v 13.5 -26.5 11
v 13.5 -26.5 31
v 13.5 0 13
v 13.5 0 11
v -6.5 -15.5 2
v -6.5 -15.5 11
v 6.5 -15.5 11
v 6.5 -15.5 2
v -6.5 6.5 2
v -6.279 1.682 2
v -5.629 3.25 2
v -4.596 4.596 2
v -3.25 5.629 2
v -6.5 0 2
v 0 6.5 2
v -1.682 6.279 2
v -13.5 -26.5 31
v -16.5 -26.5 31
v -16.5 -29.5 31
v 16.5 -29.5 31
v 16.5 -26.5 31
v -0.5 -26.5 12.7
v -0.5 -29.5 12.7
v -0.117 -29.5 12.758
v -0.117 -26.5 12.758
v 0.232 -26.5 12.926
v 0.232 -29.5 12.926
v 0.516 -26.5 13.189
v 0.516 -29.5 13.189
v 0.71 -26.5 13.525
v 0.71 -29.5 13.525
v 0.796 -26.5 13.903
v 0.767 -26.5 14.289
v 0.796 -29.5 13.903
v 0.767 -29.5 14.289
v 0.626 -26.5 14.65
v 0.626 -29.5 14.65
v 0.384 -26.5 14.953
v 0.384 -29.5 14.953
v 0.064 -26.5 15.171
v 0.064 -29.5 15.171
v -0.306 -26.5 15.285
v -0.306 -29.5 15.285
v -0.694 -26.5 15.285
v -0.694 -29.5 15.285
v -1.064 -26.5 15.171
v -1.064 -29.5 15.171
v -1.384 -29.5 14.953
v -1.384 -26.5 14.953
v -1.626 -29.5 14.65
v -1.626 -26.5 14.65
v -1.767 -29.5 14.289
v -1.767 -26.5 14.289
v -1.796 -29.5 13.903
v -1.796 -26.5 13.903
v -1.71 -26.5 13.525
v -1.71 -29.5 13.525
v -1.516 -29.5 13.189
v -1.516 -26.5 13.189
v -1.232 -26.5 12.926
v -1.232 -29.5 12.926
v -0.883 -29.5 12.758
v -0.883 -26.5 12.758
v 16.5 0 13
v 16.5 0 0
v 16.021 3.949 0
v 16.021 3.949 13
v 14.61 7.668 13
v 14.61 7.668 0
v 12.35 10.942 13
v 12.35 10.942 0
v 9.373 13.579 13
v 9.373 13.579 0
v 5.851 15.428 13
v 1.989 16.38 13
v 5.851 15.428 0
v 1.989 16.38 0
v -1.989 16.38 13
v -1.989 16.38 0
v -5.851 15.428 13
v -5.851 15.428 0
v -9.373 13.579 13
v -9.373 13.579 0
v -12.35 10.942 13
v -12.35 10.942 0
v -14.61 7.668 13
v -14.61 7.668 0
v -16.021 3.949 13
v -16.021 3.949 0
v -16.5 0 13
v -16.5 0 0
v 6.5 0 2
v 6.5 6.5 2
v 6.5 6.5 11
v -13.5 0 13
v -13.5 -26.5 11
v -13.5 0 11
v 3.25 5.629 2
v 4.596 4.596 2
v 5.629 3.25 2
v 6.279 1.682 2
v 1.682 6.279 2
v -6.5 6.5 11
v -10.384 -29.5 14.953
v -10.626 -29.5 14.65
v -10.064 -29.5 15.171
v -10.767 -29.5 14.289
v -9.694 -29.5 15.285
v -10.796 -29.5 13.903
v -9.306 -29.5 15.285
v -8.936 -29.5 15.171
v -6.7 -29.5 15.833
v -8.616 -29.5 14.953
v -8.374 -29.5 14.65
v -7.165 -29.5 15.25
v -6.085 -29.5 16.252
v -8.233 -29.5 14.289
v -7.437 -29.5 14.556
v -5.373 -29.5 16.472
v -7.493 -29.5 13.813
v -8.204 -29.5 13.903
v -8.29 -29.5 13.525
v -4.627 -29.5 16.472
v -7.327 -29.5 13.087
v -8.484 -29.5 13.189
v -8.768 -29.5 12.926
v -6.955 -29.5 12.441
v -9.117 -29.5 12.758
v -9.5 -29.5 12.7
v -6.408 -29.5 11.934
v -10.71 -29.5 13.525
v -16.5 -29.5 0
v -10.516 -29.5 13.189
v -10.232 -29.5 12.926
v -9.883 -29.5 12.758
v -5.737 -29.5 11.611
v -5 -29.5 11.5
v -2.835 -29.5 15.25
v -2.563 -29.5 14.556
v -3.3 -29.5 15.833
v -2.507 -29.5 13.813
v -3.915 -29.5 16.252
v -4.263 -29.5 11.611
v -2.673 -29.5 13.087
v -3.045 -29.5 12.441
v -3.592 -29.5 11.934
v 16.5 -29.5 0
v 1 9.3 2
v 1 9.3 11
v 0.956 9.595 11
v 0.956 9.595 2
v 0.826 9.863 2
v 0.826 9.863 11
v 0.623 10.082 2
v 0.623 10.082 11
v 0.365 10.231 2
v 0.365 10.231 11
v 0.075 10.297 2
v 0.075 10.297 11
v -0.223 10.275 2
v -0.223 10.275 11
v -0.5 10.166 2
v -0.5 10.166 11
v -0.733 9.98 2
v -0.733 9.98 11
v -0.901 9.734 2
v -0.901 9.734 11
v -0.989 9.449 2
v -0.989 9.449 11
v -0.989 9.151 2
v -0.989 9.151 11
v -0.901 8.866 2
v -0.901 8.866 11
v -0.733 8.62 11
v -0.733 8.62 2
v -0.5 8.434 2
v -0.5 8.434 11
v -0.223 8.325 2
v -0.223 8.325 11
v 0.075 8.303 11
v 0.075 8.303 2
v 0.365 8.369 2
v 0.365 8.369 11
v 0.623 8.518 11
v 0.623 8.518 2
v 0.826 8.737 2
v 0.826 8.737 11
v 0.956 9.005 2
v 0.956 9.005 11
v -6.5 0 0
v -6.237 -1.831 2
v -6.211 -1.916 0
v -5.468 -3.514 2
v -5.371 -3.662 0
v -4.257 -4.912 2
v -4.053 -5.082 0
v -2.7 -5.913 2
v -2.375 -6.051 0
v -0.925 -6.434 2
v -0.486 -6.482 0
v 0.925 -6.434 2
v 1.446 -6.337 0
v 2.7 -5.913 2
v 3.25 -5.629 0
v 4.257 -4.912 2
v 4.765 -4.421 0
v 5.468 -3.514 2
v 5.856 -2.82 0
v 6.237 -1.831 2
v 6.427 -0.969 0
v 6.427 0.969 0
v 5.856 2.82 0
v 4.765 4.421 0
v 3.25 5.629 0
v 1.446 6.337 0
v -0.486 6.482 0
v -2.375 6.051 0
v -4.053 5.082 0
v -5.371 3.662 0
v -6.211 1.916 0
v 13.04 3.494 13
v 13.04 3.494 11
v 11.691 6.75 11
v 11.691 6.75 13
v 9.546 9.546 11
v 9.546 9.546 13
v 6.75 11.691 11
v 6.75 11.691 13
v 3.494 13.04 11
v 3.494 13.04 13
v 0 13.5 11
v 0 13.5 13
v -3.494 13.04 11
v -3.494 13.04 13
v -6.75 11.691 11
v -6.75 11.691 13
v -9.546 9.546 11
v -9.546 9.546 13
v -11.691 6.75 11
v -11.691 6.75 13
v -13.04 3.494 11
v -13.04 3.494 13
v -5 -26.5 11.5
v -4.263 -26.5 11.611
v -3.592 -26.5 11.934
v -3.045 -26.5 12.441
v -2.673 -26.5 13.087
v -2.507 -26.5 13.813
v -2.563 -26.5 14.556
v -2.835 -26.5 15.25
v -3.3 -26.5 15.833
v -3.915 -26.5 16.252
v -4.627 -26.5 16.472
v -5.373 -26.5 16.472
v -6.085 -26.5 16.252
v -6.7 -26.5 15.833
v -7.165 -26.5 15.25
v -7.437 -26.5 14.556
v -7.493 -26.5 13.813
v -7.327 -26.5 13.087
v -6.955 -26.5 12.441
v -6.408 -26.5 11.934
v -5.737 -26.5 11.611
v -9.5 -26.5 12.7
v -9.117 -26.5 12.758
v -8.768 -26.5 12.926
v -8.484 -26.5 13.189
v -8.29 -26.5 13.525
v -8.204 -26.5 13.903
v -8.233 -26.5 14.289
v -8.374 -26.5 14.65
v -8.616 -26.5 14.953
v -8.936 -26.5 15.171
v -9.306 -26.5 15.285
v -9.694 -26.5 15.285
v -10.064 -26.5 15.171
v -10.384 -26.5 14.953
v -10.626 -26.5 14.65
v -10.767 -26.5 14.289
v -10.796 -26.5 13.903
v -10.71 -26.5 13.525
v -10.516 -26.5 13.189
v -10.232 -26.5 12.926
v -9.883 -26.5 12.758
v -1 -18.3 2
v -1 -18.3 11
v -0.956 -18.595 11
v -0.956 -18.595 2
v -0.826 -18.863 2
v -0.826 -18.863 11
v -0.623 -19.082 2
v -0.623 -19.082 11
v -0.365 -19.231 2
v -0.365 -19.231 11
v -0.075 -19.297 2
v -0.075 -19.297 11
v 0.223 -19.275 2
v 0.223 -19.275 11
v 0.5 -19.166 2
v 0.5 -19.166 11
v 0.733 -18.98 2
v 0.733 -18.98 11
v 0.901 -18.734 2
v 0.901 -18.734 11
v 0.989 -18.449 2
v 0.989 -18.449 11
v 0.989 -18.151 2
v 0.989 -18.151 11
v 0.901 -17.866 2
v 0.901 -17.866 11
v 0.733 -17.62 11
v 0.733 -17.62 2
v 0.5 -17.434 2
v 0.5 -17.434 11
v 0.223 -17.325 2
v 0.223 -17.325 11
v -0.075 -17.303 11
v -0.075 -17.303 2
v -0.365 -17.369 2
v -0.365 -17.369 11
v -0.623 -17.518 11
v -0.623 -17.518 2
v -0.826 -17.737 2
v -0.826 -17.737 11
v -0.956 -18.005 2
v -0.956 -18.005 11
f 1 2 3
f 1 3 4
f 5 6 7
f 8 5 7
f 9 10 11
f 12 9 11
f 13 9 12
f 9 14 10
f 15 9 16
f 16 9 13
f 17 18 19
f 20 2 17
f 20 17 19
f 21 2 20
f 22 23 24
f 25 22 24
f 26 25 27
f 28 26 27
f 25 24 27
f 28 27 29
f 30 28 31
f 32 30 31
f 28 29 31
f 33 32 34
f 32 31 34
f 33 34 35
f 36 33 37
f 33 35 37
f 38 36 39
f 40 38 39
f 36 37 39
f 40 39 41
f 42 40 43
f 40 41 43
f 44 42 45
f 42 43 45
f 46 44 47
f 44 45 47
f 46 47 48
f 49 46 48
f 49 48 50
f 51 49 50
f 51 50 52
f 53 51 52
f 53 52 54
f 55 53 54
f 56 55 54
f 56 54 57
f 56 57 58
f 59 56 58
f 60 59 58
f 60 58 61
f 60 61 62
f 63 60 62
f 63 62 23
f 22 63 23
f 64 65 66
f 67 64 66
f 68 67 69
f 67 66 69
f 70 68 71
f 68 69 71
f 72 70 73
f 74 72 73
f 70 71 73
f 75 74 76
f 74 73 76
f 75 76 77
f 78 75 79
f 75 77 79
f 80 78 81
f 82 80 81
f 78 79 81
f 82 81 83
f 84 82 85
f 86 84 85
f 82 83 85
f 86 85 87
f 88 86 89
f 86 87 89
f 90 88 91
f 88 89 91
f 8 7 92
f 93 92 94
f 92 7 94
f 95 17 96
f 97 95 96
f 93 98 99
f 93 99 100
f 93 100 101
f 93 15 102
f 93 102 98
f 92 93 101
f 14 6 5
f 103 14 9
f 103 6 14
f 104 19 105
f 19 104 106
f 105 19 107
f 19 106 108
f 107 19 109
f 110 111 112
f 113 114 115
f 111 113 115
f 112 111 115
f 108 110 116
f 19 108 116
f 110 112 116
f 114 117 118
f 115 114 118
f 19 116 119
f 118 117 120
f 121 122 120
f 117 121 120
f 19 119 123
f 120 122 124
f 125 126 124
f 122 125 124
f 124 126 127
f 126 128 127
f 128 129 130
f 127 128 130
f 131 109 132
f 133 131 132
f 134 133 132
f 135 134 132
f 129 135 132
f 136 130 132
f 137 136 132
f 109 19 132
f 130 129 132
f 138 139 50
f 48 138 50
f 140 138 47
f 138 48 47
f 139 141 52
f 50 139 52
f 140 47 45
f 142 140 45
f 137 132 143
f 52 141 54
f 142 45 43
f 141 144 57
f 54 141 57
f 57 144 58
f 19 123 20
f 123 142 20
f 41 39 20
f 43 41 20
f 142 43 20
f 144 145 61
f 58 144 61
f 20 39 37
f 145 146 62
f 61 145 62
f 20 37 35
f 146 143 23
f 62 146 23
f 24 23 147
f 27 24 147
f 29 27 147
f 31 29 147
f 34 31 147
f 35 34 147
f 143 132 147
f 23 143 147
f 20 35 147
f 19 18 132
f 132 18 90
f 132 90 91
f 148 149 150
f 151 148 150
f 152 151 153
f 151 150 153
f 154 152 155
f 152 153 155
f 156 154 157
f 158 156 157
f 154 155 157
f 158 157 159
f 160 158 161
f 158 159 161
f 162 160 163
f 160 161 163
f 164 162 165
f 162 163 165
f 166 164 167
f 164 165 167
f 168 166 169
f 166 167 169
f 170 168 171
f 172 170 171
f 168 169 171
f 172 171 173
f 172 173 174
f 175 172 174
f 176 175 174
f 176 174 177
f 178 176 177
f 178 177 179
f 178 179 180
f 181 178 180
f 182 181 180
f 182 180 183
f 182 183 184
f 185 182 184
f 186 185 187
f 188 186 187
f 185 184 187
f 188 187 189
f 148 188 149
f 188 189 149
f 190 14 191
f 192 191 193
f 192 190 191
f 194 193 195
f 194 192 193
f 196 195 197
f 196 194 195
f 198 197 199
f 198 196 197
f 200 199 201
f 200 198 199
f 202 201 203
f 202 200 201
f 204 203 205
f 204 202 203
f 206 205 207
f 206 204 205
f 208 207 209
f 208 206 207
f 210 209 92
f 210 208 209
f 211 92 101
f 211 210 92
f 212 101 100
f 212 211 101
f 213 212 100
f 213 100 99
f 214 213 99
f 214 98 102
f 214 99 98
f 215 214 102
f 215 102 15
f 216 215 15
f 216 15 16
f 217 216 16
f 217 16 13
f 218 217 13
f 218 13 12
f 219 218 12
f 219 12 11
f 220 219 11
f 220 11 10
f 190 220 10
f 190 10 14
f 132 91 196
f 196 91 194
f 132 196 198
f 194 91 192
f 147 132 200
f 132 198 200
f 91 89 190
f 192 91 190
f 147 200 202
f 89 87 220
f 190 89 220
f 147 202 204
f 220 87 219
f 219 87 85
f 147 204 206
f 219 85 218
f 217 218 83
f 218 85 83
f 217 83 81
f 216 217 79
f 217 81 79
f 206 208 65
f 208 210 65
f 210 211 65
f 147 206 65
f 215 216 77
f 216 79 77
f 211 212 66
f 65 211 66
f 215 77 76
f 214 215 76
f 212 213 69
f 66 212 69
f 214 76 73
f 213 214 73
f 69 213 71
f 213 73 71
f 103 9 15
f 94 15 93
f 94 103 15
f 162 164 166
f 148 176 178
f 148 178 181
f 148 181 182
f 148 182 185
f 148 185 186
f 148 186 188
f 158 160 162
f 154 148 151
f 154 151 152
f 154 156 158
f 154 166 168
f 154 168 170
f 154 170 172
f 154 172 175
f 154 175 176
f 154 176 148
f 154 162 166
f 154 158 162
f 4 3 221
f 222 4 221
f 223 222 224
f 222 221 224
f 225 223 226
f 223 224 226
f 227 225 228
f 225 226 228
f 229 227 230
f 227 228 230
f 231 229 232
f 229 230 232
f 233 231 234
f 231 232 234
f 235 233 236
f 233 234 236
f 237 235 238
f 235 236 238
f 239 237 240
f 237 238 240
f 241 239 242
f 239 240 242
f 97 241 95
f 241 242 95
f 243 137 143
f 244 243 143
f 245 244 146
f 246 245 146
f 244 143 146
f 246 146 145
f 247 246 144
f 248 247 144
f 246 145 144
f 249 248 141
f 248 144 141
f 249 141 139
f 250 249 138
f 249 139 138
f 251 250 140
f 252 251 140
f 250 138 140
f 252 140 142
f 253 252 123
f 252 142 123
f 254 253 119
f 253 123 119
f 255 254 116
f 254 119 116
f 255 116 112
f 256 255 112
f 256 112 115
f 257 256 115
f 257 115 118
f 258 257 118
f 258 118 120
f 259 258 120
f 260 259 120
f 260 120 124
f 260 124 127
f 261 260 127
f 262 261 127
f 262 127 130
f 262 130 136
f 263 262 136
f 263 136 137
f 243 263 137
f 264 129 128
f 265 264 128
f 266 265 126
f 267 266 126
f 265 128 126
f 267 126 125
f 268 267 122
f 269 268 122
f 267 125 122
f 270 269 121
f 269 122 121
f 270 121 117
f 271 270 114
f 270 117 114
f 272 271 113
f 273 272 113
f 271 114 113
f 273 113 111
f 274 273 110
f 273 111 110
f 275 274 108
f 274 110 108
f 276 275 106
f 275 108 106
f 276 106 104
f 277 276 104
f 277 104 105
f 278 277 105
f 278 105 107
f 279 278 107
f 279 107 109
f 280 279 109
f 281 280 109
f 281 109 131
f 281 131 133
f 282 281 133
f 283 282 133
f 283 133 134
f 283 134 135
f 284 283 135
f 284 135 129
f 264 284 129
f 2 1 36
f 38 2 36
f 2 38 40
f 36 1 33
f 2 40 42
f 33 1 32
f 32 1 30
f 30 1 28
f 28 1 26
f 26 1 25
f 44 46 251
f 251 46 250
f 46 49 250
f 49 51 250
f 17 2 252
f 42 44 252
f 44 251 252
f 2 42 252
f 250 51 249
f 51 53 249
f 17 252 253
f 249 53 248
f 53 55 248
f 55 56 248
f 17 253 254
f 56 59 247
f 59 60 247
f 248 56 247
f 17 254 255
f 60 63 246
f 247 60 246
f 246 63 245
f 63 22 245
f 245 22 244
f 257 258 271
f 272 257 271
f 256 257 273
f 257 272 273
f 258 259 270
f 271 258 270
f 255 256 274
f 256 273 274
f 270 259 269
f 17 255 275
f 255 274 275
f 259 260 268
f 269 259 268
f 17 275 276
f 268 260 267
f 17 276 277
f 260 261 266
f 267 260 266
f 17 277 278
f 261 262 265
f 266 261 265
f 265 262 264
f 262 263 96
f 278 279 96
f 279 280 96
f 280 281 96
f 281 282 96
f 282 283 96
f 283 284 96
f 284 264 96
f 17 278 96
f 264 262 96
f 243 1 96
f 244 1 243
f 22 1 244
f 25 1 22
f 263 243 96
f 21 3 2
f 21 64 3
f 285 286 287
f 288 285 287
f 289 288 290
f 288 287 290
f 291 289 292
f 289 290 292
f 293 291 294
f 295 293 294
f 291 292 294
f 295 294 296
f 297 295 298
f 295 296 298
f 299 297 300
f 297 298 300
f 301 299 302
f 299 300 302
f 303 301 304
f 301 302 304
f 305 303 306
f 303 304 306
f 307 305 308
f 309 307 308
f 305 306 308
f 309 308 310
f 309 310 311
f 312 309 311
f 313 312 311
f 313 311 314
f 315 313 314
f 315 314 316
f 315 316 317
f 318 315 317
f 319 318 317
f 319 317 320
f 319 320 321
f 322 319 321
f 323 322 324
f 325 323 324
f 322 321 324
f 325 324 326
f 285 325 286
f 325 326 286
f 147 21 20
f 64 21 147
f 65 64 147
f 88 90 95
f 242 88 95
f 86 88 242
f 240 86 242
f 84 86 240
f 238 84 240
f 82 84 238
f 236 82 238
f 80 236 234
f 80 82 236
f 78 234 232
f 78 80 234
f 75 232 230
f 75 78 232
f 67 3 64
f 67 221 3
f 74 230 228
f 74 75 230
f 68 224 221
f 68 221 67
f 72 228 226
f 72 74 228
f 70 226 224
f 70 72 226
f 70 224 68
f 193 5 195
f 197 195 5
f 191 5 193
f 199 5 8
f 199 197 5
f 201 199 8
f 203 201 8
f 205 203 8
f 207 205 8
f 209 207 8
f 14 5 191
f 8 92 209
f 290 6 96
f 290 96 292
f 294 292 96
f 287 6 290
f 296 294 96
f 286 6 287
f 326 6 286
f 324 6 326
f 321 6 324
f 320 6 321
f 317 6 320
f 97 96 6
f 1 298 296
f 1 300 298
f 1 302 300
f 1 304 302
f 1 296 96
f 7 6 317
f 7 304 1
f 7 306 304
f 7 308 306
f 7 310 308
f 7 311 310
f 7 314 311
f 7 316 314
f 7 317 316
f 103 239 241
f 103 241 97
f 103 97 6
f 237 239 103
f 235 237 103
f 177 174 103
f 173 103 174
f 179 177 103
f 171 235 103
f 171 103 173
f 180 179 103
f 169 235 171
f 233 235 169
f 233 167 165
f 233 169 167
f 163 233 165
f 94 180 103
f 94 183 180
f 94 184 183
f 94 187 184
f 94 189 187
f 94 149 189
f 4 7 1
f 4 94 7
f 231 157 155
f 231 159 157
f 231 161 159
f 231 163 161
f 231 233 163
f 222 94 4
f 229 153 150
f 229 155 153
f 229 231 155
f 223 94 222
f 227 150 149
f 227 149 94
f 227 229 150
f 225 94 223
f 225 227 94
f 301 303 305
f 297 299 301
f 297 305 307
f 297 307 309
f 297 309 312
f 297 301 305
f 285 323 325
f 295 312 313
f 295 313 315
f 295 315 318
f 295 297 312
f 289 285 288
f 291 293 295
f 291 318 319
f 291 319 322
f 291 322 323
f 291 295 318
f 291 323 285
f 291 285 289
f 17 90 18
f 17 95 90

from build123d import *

# Parameters (mm, degrees)
SKETCH1_R           = 6.5
BOSS_EXTRUDE1_DEPTH = 13
CUT_EXTRUDE1_DEPTH  = 2
SKETCH3_R           = 1
SKETCH3_W           = 13
SKETCH3_H           = 22
CUT_EXTRUDE2_DEPTH  = 9
BOSS_EXTRUDE2_DEPTH = 18
BOSS_EXTRUDE3_DEPTH = 1.5
BOSS_EXTRUDE4_DEPTH = 1.5
SKETCH7_R           = 2.5
SKETCH7_R_2         = 1.3
CUT_EXTRUDE3_DEPTH  = 5


with BuildPart() as part:
    # Sketch1 → Boss-Extrude1 (new body)
    with BuildSketch(Plane.XY):
        with BuildLine():
            Line((-16.5, 0), (-16.5, -29.5))
            Line((-16.5, -29.5), (16.5, -29.5))
            Line((16.5, -29.5), (16.5, 0))
            ThreePointArc((16.5, 0), (0, 16.5), (-16.5, 0))
        make_face()
        with Locations(Location((0, 0, 0), (0, 0, 180))):
            Circle(SKETCH1_R, mode=Mode.SUBTRACT)
    extrude(amount=BOSS_EXTRUDE1_DEPTH)

    # Sketch2 → Cut-Extrude1 (cut)
    with BuildSketch(Plane.XY.offset(13)):
        with BuildLine():
            Line((-13.5, -26.5), (13.5, -26.5))
            Line((13.5, -26.5), (13.5, 0))
            ThreePointArc((13.5, 0), (0, 13.5), (-13.5, 0))
            Line((-13.5, 0), (-13.5, -26.5))
        make_face()
    extrude(amount=-CUT_EXTRUDE1_DEPTH, mode=Mode.SUBTRACT)

    # Sketch3 → Cut-Extrude2 (cut)
    with BuildSketch(Plane.XY.offset(11)):
        with Locations((0, 9.3)):
            Circle(SKETCH3_R)
        with Locations(Location((0, -18.3, 0), (0, 0, 180))):
            Circle(SKETCH3_R)
        with Locations((0, -4.5)):
            Rectangle(SKETCH3_W, SKETCH3_H)
    extrude(amount=-CUT_EXTRUDE2_DEPTH, mode=Mode.SUBTRACT)

    # Sketch4 → Boss-Extrude2 (add)
    with BuildSketch(Plane.XY.offset(13)):
        Polygon((-16.5, -26.5), (-16.5, -29.5), (16.5, -29.5), (16.5, -26.5), (13.5, -26.5), (-13.5, -26.5), align=None)
    extrude(amount=BOSS_EXTRUDE2_DEPTH)

    # Sketch5 → Boss-Extrude3 (add, symmetric)
    with BuildSketch(Plane(origin=(-15, 0, 0), x_dir=(0, 0, -1), z_dir=(1, 0, 0))):
        Polygon((-13, 0), (-31, -26.5), (-13, -26.5), align=None)
    extrude(amount=BOSS_EXTRUDE3_DEPTH, both=True)

    # Sketch6 → Boss-Extrude4 (add, symmetric)
    with BuildSketch(Plane(origin=(15, 0, 0), x_dir=(0, 0, -1), z_dir=(1, 0, 0))):
        Polygon((-13, 0), (-31, -26.5), (-13, -26.5), align=None)
    extrude(amount=BOSS_EXTRUDE4_DEPTH, both=True)

    # Sketch7 → Cut-Extrude3 (cut)
    with BuildSketch(Plane.XZ.offset(29.5)):
        with Locations(Location((-5, 14, 0), (0, 0, 270))):
            Circle(SKETCH7_R)
        with Locations(Location((-0.5, 14, 0), (0, 0, 270))):
            Circle(SKETCH7_R_2)
        with Locations(Location((-9.5, 14, 0), (0, 0, 270))):
            Circle(SKETCH7_R_2)
    extrude(amount=-CUT_EXTRUDE3_DEPTH, mode=Mode.SUBTRACT)


solid = part.part
